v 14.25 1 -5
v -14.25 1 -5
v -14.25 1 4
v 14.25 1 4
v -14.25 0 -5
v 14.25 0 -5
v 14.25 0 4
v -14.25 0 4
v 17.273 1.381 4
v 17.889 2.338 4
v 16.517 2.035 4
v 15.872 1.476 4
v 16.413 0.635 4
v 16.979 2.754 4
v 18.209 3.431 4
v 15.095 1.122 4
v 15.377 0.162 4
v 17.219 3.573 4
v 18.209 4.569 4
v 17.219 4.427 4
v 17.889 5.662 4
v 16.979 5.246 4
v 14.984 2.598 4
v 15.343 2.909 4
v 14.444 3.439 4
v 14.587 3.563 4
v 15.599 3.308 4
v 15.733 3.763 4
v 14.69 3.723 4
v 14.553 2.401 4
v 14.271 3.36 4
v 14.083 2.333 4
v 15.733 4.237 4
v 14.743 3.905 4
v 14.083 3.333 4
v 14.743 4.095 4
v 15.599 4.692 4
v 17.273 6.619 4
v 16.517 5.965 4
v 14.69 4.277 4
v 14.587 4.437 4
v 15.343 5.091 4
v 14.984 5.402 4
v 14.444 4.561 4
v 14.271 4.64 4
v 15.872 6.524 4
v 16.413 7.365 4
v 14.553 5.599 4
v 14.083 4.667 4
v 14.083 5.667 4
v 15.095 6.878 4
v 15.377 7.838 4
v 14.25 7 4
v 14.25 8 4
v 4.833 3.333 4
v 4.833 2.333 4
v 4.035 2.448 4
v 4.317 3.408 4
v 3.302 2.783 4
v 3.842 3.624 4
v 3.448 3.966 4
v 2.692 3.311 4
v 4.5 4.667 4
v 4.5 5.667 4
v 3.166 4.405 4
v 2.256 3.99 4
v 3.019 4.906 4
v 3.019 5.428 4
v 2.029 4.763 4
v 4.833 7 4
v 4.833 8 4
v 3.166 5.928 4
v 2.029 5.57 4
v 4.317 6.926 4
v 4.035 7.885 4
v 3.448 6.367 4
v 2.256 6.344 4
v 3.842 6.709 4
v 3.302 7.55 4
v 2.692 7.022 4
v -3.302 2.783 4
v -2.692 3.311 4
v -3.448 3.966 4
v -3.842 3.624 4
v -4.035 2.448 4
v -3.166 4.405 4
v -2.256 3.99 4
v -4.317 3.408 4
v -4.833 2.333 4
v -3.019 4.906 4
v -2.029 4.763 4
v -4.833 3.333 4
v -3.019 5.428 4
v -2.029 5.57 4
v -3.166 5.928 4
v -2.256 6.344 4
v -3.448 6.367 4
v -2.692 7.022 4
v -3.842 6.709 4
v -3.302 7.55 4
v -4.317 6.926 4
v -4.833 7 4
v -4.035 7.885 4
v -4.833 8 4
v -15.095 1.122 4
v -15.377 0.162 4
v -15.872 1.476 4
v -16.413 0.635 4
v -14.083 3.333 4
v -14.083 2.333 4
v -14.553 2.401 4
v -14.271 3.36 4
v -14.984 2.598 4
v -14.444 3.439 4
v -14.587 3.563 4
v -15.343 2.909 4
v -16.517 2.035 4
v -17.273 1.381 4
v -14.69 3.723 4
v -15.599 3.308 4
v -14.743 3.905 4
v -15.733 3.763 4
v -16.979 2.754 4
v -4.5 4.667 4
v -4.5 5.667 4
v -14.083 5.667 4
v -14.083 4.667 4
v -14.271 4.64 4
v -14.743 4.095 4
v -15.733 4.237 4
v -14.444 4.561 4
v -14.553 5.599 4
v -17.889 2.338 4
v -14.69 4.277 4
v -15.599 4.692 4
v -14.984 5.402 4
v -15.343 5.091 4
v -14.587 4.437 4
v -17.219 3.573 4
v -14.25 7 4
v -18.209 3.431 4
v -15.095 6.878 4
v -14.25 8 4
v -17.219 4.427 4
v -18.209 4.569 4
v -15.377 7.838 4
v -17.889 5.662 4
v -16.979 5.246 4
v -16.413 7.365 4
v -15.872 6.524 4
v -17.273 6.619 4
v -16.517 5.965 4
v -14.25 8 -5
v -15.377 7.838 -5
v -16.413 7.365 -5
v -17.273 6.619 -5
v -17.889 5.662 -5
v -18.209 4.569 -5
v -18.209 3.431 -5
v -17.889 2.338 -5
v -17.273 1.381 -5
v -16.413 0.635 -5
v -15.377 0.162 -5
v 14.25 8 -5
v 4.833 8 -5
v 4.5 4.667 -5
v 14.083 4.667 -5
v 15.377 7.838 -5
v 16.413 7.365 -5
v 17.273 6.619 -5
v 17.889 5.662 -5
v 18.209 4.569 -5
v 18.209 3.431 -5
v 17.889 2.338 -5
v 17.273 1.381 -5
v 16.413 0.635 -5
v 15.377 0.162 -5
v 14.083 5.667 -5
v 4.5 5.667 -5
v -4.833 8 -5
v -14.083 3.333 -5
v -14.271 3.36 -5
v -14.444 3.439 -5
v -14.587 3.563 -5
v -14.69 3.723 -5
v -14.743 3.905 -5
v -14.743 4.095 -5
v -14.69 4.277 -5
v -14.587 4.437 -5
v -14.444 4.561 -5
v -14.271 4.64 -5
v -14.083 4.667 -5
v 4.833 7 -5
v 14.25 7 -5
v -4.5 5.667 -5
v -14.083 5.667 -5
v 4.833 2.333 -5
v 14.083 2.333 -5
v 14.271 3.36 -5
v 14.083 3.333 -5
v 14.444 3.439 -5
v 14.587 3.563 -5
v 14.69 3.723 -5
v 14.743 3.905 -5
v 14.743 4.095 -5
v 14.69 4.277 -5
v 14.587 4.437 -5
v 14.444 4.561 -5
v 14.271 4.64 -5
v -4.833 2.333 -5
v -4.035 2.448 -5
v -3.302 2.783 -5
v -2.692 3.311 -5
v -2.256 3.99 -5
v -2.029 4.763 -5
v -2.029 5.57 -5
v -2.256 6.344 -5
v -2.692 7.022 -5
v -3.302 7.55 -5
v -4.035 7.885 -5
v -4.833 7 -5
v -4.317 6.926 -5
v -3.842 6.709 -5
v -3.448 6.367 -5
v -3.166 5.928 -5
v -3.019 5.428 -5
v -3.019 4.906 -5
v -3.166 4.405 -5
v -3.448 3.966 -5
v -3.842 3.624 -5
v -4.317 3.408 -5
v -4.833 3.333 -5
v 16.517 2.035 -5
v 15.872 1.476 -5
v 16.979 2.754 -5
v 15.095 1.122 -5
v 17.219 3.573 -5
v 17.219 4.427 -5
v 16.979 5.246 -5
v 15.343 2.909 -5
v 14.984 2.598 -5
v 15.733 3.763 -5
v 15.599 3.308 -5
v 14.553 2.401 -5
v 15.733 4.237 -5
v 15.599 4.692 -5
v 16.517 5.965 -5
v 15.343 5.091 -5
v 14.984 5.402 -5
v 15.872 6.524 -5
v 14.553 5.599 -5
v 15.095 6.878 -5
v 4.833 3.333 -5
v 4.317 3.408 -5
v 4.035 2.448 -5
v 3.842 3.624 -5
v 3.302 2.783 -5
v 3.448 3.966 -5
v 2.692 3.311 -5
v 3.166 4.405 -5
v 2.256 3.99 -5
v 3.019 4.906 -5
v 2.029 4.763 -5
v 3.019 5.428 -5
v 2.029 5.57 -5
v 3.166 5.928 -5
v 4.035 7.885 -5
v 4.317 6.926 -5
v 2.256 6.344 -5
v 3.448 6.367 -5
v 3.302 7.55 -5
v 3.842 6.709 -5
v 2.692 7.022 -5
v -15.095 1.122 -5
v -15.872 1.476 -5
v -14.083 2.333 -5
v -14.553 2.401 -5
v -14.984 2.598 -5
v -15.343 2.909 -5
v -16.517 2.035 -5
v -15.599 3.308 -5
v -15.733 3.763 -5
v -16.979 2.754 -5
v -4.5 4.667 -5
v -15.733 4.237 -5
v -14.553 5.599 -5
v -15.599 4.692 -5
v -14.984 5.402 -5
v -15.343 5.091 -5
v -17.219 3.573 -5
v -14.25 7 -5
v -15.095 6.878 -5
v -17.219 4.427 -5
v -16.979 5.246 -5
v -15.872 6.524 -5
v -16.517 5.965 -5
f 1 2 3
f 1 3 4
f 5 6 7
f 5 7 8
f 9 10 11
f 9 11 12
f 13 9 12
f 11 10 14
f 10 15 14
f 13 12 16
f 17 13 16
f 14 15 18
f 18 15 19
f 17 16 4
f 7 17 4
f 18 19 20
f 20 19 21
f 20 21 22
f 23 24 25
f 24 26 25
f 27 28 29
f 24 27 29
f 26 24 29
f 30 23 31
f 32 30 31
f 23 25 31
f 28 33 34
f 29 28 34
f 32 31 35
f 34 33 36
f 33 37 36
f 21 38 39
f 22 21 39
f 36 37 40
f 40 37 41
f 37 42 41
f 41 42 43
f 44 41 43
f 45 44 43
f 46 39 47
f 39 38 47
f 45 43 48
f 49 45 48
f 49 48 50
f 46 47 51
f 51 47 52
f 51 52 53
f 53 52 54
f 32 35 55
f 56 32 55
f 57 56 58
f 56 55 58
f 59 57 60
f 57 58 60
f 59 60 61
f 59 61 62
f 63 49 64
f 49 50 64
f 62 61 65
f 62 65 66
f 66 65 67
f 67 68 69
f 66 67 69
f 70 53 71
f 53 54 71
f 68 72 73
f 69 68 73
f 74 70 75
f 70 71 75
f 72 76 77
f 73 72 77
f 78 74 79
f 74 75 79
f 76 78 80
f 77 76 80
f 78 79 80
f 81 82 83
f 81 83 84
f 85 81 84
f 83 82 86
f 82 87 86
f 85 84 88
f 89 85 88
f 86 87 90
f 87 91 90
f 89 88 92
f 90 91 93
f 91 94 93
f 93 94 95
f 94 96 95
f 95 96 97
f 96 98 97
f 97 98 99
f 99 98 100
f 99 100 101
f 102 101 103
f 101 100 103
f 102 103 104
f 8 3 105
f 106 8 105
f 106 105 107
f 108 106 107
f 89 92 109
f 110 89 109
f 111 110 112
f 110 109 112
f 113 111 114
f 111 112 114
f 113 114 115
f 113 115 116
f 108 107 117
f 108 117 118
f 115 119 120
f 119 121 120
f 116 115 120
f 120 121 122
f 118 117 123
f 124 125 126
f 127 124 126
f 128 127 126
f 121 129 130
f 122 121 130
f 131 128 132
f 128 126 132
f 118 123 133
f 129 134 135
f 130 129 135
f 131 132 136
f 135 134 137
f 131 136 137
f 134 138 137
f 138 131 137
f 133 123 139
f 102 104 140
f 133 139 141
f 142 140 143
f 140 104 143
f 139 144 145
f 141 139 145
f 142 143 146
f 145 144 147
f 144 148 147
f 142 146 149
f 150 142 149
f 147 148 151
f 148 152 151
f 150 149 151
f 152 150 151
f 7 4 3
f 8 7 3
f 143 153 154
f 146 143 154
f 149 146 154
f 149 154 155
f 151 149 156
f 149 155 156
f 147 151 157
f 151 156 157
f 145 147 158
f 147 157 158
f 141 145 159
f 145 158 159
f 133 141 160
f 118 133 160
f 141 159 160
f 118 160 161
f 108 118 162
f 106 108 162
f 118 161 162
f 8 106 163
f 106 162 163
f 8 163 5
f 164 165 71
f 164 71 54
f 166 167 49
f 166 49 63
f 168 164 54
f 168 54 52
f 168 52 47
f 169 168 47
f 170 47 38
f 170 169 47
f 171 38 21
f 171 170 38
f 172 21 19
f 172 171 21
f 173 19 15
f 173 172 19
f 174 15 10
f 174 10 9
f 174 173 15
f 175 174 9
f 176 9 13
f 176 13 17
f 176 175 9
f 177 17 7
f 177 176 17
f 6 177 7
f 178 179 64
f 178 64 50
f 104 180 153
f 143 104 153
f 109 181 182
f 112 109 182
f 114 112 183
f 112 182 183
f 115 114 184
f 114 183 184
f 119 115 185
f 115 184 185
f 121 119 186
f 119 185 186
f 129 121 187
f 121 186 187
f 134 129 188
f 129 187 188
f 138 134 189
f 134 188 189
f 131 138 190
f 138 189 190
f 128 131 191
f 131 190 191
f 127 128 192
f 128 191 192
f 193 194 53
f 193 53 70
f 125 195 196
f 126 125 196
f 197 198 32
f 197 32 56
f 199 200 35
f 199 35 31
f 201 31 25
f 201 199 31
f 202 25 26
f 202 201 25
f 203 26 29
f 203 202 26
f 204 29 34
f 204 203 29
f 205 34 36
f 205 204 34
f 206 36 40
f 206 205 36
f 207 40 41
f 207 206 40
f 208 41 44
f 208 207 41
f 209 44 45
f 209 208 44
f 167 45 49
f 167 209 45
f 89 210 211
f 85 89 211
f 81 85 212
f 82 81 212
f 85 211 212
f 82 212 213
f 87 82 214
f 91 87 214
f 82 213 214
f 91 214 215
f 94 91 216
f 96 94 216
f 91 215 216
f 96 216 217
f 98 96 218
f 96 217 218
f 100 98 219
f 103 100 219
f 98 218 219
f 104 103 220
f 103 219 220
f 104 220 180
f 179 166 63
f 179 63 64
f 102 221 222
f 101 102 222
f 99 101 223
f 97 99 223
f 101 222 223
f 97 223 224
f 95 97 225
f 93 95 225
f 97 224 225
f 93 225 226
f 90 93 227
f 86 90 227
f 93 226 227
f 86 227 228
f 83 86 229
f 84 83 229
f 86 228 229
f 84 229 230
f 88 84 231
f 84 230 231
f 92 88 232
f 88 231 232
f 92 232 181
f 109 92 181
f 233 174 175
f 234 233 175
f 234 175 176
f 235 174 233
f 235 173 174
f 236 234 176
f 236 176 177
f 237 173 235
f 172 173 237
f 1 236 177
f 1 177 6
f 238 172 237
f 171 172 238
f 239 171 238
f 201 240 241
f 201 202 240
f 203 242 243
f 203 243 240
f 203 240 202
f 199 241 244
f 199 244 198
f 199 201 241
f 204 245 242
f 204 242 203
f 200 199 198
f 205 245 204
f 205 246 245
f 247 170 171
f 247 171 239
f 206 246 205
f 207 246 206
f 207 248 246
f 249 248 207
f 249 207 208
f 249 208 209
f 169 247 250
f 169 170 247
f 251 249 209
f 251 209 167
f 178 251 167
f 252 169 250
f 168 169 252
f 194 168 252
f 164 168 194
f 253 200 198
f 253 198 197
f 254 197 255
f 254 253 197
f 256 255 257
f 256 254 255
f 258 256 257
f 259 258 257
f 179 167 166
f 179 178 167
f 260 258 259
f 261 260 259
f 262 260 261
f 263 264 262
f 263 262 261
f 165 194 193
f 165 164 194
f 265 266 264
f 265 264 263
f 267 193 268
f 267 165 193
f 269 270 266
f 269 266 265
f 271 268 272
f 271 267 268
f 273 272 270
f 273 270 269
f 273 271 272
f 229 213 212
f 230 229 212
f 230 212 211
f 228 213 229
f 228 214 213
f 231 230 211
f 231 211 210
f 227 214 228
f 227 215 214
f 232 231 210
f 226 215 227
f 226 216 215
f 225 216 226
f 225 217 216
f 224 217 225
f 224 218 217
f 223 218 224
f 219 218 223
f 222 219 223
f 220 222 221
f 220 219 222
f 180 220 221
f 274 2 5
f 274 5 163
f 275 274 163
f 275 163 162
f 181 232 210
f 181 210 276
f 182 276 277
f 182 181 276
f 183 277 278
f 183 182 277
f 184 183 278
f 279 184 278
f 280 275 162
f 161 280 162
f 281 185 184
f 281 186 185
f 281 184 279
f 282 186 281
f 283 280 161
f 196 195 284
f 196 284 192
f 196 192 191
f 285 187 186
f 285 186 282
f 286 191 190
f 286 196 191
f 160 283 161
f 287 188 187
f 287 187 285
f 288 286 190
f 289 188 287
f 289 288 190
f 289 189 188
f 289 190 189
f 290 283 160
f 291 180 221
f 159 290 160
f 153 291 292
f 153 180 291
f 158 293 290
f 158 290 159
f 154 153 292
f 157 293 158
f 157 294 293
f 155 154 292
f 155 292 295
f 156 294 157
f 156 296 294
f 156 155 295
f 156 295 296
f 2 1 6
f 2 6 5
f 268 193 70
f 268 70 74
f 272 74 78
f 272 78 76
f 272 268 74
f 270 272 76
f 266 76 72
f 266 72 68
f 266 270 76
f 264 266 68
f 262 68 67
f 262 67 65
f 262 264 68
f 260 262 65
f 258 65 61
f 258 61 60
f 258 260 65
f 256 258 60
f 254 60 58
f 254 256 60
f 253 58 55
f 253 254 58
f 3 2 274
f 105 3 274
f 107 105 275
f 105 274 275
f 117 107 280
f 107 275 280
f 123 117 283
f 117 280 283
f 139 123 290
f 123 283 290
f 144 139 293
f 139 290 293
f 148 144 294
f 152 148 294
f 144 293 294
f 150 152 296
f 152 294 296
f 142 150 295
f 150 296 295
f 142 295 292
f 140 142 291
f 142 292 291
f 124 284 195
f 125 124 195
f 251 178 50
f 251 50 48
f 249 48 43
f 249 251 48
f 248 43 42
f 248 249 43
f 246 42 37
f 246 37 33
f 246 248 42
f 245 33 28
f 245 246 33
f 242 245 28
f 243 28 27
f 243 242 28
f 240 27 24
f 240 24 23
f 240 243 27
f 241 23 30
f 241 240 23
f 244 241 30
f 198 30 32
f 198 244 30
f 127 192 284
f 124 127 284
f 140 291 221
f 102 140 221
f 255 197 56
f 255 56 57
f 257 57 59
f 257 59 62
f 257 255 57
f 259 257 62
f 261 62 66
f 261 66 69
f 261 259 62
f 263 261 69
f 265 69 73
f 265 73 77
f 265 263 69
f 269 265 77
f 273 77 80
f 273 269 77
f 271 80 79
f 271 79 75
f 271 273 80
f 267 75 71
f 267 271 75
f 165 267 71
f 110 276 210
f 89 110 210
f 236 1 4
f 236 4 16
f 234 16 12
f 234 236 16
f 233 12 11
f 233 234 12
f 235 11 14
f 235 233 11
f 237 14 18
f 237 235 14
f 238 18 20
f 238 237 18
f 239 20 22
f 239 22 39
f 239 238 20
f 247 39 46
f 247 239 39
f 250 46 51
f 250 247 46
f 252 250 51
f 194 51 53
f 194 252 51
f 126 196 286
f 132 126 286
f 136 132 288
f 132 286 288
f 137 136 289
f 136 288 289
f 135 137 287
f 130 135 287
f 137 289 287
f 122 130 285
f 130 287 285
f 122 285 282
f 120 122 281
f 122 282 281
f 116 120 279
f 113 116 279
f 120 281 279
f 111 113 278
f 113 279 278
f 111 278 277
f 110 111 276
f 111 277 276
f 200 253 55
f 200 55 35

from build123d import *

# Parameters (mm, degrees)
BOSS_EXTRUDE2_START = -5
BOSS_EXTRUDE2_DEPTH = 9


with BuildPart() as part:
    # Sketch1 → Boss-Extrude2 (new body)
    with BuildSketch(Plane.XY.offset(BOSS_EXTRUDE2_START)):
        with BuildLine():
            ThreePointArc((-14.25, 1), (-17.25, 4), (-14.25, 7))
            Line((-14.25, 7), (-4.833333322, 7))
            ThreePointArc((-4.833333322, 7), (-3, 5.166666661), (-4.833333333, 3.333333333))
            Line((-4.833333333, 3.333333333), (-14.083333333, 3.333333333))
            ThreePointArc((-14.083333333, 3.333333333), (-14.75, 4), (-14.083333333, 4.666666667))
            Line((-14.083333333, 4.666666667), (-4.5, 4.666666667))
            Line((-4.5, 4.666666667), (-4.5, 5.666666667))
            Line((-4.5, 5.666666667), (-14.083333333, 5.666666667))
            ThreePointArc((-14.083333333, 5.666666667), (-15.75, 4), (-14.083333333, 2.333333333))
            Line((-14.083333333, 2.333333333), (-4.833333333, 2.333333333))
            ThreePointArc((-4.833333333, 2.333333333), (-2, 5.166666667), (-4.833333333, 8))
            Line((-4.833333333, 8), (-14.25, 8))
            ThreePointArc((-14.25, 8), (-18.25, 4), (-14.25, 0))
            Line((-14.25, 0), (0, 0))
            Line((0, 0), (0, 1))
            Line((0, 1), (-14.25, 1))
        make_face()
    boss_extrude2 = extrude(amount=BOSS_EXTRUDE2_DEPTH)

    # Mirror1: Boss-Extrude2 across plane
    add(boss_extrude2.mirror(Plane(origin=(0, 0, 0), x_dir=(0, 0, 1), z_dir=(1, 0, 0))))


solid = part.part
